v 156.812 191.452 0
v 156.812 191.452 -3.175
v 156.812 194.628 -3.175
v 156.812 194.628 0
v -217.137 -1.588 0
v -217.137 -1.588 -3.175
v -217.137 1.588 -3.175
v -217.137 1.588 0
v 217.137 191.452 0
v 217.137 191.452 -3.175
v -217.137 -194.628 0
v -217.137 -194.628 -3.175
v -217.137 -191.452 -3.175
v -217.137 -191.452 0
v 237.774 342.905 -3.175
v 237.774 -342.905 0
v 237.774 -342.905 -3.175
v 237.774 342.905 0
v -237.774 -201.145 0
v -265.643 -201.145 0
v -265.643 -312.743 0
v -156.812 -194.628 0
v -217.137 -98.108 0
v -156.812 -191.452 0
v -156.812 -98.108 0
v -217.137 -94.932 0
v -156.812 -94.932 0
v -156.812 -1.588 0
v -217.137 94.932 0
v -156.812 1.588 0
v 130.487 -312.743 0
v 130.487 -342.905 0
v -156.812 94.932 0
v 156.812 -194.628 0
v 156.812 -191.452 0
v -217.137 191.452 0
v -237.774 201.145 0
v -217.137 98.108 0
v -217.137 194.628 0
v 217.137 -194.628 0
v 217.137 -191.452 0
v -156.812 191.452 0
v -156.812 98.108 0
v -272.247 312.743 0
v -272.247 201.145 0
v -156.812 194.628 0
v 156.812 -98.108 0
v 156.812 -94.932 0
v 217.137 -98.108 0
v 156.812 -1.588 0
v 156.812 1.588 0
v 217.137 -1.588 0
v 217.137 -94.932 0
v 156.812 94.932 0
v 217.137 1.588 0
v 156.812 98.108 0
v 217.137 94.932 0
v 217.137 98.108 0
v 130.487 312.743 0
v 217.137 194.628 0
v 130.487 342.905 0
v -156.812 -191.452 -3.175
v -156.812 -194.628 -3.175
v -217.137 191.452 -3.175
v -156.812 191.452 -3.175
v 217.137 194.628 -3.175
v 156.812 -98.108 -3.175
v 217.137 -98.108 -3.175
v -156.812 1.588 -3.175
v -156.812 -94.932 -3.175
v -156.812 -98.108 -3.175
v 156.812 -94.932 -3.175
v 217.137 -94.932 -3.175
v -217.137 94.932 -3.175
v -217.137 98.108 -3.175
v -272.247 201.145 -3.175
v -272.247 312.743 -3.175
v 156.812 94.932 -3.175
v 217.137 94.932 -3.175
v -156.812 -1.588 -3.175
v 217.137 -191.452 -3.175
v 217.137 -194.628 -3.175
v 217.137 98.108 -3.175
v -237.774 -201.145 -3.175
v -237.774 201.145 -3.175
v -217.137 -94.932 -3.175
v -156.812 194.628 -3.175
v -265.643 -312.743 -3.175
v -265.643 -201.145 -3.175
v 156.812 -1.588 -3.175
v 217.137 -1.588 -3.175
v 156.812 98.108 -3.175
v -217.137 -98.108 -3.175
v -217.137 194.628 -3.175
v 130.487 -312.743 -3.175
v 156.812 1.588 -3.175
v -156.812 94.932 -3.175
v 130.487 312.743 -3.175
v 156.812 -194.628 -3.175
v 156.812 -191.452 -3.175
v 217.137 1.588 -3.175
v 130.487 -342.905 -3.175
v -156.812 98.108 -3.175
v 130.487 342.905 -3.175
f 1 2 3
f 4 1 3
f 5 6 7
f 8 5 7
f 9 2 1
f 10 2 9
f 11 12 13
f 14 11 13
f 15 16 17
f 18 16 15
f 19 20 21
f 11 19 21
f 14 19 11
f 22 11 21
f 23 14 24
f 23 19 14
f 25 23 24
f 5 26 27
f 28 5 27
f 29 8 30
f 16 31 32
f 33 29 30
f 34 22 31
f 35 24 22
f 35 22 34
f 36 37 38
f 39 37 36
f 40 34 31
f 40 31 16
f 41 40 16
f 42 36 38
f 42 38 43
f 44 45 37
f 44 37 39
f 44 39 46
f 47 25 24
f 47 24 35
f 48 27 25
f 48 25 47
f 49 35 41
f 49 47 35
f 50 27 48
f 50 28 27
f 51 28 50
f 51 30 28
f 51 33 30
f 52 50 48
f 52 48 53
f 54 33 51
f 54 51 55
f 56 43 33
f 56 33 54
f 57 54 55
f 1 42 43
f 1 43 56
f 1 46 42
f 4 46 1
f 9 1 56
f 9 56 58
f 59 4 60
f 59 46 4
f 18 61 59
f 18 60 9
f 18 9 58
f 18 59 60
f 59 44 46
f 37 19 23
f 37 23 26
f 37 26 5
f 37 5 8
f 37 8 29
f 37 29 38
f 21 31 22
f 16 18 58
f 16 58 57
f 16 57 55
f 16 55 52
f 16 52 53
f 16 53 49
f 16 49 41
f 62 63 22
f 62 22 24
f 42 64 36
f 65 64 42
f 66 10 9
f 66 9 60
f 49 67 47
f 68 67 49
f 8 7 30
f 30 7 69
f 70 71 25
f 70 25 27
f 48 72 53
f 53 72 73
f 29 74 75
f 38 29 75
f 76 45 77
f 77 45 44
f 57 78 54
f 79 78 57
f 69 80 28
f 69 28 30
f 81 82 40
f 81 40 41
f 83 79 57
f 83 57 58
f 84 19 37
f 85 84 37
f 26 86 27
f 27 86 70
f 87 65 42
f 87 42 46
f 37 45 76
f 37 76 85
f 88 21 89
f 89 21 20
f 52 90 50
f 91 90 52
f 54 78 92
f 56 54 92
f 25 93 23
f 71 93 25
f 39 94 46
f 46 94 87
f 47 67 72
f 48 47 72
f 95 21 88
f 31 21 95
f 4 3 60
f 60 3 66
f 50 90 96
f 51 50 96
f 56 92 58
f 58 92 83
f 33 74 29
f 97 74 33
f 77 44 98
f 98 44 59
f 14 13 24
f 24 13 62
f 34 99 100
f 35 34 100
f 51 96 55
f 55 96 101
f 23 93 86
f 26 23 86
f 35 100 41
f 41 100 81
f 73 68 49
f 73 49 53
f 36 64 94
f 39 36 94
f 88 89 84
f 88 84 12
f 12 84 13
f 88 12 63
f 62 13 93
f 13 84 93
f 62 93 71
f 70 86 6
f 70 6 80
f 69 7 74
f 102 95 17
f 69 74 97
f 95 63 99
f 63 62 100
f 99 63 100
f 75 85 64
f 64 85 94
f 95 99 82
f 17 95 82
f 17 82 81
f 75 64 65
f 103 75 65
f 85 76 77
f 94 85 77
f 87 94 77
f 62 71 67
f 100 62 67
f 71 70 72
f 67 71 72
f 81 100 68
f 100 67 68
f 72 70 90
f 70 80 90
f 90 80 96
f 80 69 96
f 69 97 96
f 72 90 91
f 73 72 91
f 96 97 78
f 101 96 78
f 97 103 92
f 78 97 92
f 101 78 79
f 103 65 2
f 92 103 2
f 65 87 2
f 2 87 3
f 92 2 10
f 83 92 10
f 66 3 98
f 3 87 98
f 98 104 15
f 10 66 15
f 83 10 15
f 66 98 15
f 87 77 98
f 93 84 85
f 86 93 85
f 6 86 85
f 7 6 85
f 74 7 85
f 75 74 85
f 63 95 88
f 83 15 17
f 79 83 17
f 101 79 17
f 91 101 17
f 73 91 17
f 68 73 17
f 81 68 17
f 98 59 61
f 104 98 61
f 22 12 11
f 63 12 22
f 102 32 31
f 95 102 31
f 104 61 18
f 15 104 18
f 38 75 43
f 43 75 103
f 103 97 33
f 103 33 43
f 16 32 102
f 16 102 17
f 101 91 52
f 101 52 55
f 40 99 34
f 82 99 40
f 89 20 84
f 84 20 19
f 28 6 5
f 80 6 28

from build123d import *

# Parameters (mm, degrees)
SKETCH1_W               = 475.54896
SKETCH1_H               = 625.48516
BASE_FLANGE1_DEPTH      = 3.175
CUT_EXTRUDE1_DEPTH      = 393.880013884
CUT_EXTRUDE1_DEPTH_BACK = 393.880013884
SKETCH2_W               = 60.325
SKETCH2_H               = 3.175
SKETCH3_W               = 107.287119944
SKETCH3_H               = 30.1625
SKETCH3_W_2             = 34.47288
SKETCH3_H_2             = 111.597499944
SKETCH3_W_3             = 27.86888
BOSS_EXTRUDE1_DEPTH     = 3.175


# Sheet-metal steps are written as plain solids
with BuildPart() as part:
    # Sketch1 → Base-Flange1 (new body)
    with BuildSketch(Plane.XY):
        Rectangle(SKETCH1_W, SKETCH1_H)
    extrude(amount=-BASE_FLANGE1_DEPTH)

    # Sketch2 → Cut-Extrude1 (cut, two sides: drawn at the far end of the back side and taken through both)
    with BuildSketch(Plane.XY.offset(-CUT_EXTRUDE1_DEPTH_BACK)):
        with Locations((-186.97448, 96.52)):
            Rectangle(SKETCH2_W, SKETCH2_H)
        with Locations((-186.97448, 0)):
            Rectangle(SKETCH2_W, SKETCH2_H)
        with Locations((186.97448, 0)):
            Rectangle(SKETCH2_W, SKETCH2_H)
        with Locations((186.97448, 96.52)):
            Rectangle(SKETCH2_W, SKETCH2_H)
        with Locations((-186.97448, 193.04)):
            Rectangle(SKETCH2_W, SKETCH2_H)
        with Locations((186.97448, 193.04)):
            Rectangle(SKETCH2_W, SKETCH2_H)
        with Locations((-186.97448, -96.52)):
            Rectangle(SKETCH2_W, SKETCH2_H)
        with Locations((186.97448, -96.52)):
            Rectangle(SKETCH2_W, SKETCH2_H)
        with Locations((-186.97448, -193.04)):
            Rectangle(SKETCH2_W, SKETCH2_H)
        with Locations((186.97448, -193.04)):
            Rectangle(SKETCH2_W, SKETCH2_H)
    extrude(amount=CUT_EXTRUDE1_DEPTH + CUT_EXTRUDE1_DEPTH_BACK, mode=Mode.SUBTRACT)

    # Sketch3 → Boss-Extrude1 (add)
    with BuildSketch(Plane.XY):
        with Locations((184.130920028, 327.82383)):
            Rectangle(SKETCH3_W, SKETCH3_H)
        with Locations((-255.01092, 256.943830028)):
            Rectangle(SKETCH3_W_2, SKETCH3_H_2)
        with Locations((-251.70892, -256.943830028)):
            Rectangle(SKETCH3_W_3, SKETCH3_H_2)
        with Locations((184.130920028, -327.82383)):
            Rectangle(SKETCH3_W, SKETCH3_H)
    extrude(amount=-BOSS_EXTRUDE1_DEPTH)


solid = part.part
